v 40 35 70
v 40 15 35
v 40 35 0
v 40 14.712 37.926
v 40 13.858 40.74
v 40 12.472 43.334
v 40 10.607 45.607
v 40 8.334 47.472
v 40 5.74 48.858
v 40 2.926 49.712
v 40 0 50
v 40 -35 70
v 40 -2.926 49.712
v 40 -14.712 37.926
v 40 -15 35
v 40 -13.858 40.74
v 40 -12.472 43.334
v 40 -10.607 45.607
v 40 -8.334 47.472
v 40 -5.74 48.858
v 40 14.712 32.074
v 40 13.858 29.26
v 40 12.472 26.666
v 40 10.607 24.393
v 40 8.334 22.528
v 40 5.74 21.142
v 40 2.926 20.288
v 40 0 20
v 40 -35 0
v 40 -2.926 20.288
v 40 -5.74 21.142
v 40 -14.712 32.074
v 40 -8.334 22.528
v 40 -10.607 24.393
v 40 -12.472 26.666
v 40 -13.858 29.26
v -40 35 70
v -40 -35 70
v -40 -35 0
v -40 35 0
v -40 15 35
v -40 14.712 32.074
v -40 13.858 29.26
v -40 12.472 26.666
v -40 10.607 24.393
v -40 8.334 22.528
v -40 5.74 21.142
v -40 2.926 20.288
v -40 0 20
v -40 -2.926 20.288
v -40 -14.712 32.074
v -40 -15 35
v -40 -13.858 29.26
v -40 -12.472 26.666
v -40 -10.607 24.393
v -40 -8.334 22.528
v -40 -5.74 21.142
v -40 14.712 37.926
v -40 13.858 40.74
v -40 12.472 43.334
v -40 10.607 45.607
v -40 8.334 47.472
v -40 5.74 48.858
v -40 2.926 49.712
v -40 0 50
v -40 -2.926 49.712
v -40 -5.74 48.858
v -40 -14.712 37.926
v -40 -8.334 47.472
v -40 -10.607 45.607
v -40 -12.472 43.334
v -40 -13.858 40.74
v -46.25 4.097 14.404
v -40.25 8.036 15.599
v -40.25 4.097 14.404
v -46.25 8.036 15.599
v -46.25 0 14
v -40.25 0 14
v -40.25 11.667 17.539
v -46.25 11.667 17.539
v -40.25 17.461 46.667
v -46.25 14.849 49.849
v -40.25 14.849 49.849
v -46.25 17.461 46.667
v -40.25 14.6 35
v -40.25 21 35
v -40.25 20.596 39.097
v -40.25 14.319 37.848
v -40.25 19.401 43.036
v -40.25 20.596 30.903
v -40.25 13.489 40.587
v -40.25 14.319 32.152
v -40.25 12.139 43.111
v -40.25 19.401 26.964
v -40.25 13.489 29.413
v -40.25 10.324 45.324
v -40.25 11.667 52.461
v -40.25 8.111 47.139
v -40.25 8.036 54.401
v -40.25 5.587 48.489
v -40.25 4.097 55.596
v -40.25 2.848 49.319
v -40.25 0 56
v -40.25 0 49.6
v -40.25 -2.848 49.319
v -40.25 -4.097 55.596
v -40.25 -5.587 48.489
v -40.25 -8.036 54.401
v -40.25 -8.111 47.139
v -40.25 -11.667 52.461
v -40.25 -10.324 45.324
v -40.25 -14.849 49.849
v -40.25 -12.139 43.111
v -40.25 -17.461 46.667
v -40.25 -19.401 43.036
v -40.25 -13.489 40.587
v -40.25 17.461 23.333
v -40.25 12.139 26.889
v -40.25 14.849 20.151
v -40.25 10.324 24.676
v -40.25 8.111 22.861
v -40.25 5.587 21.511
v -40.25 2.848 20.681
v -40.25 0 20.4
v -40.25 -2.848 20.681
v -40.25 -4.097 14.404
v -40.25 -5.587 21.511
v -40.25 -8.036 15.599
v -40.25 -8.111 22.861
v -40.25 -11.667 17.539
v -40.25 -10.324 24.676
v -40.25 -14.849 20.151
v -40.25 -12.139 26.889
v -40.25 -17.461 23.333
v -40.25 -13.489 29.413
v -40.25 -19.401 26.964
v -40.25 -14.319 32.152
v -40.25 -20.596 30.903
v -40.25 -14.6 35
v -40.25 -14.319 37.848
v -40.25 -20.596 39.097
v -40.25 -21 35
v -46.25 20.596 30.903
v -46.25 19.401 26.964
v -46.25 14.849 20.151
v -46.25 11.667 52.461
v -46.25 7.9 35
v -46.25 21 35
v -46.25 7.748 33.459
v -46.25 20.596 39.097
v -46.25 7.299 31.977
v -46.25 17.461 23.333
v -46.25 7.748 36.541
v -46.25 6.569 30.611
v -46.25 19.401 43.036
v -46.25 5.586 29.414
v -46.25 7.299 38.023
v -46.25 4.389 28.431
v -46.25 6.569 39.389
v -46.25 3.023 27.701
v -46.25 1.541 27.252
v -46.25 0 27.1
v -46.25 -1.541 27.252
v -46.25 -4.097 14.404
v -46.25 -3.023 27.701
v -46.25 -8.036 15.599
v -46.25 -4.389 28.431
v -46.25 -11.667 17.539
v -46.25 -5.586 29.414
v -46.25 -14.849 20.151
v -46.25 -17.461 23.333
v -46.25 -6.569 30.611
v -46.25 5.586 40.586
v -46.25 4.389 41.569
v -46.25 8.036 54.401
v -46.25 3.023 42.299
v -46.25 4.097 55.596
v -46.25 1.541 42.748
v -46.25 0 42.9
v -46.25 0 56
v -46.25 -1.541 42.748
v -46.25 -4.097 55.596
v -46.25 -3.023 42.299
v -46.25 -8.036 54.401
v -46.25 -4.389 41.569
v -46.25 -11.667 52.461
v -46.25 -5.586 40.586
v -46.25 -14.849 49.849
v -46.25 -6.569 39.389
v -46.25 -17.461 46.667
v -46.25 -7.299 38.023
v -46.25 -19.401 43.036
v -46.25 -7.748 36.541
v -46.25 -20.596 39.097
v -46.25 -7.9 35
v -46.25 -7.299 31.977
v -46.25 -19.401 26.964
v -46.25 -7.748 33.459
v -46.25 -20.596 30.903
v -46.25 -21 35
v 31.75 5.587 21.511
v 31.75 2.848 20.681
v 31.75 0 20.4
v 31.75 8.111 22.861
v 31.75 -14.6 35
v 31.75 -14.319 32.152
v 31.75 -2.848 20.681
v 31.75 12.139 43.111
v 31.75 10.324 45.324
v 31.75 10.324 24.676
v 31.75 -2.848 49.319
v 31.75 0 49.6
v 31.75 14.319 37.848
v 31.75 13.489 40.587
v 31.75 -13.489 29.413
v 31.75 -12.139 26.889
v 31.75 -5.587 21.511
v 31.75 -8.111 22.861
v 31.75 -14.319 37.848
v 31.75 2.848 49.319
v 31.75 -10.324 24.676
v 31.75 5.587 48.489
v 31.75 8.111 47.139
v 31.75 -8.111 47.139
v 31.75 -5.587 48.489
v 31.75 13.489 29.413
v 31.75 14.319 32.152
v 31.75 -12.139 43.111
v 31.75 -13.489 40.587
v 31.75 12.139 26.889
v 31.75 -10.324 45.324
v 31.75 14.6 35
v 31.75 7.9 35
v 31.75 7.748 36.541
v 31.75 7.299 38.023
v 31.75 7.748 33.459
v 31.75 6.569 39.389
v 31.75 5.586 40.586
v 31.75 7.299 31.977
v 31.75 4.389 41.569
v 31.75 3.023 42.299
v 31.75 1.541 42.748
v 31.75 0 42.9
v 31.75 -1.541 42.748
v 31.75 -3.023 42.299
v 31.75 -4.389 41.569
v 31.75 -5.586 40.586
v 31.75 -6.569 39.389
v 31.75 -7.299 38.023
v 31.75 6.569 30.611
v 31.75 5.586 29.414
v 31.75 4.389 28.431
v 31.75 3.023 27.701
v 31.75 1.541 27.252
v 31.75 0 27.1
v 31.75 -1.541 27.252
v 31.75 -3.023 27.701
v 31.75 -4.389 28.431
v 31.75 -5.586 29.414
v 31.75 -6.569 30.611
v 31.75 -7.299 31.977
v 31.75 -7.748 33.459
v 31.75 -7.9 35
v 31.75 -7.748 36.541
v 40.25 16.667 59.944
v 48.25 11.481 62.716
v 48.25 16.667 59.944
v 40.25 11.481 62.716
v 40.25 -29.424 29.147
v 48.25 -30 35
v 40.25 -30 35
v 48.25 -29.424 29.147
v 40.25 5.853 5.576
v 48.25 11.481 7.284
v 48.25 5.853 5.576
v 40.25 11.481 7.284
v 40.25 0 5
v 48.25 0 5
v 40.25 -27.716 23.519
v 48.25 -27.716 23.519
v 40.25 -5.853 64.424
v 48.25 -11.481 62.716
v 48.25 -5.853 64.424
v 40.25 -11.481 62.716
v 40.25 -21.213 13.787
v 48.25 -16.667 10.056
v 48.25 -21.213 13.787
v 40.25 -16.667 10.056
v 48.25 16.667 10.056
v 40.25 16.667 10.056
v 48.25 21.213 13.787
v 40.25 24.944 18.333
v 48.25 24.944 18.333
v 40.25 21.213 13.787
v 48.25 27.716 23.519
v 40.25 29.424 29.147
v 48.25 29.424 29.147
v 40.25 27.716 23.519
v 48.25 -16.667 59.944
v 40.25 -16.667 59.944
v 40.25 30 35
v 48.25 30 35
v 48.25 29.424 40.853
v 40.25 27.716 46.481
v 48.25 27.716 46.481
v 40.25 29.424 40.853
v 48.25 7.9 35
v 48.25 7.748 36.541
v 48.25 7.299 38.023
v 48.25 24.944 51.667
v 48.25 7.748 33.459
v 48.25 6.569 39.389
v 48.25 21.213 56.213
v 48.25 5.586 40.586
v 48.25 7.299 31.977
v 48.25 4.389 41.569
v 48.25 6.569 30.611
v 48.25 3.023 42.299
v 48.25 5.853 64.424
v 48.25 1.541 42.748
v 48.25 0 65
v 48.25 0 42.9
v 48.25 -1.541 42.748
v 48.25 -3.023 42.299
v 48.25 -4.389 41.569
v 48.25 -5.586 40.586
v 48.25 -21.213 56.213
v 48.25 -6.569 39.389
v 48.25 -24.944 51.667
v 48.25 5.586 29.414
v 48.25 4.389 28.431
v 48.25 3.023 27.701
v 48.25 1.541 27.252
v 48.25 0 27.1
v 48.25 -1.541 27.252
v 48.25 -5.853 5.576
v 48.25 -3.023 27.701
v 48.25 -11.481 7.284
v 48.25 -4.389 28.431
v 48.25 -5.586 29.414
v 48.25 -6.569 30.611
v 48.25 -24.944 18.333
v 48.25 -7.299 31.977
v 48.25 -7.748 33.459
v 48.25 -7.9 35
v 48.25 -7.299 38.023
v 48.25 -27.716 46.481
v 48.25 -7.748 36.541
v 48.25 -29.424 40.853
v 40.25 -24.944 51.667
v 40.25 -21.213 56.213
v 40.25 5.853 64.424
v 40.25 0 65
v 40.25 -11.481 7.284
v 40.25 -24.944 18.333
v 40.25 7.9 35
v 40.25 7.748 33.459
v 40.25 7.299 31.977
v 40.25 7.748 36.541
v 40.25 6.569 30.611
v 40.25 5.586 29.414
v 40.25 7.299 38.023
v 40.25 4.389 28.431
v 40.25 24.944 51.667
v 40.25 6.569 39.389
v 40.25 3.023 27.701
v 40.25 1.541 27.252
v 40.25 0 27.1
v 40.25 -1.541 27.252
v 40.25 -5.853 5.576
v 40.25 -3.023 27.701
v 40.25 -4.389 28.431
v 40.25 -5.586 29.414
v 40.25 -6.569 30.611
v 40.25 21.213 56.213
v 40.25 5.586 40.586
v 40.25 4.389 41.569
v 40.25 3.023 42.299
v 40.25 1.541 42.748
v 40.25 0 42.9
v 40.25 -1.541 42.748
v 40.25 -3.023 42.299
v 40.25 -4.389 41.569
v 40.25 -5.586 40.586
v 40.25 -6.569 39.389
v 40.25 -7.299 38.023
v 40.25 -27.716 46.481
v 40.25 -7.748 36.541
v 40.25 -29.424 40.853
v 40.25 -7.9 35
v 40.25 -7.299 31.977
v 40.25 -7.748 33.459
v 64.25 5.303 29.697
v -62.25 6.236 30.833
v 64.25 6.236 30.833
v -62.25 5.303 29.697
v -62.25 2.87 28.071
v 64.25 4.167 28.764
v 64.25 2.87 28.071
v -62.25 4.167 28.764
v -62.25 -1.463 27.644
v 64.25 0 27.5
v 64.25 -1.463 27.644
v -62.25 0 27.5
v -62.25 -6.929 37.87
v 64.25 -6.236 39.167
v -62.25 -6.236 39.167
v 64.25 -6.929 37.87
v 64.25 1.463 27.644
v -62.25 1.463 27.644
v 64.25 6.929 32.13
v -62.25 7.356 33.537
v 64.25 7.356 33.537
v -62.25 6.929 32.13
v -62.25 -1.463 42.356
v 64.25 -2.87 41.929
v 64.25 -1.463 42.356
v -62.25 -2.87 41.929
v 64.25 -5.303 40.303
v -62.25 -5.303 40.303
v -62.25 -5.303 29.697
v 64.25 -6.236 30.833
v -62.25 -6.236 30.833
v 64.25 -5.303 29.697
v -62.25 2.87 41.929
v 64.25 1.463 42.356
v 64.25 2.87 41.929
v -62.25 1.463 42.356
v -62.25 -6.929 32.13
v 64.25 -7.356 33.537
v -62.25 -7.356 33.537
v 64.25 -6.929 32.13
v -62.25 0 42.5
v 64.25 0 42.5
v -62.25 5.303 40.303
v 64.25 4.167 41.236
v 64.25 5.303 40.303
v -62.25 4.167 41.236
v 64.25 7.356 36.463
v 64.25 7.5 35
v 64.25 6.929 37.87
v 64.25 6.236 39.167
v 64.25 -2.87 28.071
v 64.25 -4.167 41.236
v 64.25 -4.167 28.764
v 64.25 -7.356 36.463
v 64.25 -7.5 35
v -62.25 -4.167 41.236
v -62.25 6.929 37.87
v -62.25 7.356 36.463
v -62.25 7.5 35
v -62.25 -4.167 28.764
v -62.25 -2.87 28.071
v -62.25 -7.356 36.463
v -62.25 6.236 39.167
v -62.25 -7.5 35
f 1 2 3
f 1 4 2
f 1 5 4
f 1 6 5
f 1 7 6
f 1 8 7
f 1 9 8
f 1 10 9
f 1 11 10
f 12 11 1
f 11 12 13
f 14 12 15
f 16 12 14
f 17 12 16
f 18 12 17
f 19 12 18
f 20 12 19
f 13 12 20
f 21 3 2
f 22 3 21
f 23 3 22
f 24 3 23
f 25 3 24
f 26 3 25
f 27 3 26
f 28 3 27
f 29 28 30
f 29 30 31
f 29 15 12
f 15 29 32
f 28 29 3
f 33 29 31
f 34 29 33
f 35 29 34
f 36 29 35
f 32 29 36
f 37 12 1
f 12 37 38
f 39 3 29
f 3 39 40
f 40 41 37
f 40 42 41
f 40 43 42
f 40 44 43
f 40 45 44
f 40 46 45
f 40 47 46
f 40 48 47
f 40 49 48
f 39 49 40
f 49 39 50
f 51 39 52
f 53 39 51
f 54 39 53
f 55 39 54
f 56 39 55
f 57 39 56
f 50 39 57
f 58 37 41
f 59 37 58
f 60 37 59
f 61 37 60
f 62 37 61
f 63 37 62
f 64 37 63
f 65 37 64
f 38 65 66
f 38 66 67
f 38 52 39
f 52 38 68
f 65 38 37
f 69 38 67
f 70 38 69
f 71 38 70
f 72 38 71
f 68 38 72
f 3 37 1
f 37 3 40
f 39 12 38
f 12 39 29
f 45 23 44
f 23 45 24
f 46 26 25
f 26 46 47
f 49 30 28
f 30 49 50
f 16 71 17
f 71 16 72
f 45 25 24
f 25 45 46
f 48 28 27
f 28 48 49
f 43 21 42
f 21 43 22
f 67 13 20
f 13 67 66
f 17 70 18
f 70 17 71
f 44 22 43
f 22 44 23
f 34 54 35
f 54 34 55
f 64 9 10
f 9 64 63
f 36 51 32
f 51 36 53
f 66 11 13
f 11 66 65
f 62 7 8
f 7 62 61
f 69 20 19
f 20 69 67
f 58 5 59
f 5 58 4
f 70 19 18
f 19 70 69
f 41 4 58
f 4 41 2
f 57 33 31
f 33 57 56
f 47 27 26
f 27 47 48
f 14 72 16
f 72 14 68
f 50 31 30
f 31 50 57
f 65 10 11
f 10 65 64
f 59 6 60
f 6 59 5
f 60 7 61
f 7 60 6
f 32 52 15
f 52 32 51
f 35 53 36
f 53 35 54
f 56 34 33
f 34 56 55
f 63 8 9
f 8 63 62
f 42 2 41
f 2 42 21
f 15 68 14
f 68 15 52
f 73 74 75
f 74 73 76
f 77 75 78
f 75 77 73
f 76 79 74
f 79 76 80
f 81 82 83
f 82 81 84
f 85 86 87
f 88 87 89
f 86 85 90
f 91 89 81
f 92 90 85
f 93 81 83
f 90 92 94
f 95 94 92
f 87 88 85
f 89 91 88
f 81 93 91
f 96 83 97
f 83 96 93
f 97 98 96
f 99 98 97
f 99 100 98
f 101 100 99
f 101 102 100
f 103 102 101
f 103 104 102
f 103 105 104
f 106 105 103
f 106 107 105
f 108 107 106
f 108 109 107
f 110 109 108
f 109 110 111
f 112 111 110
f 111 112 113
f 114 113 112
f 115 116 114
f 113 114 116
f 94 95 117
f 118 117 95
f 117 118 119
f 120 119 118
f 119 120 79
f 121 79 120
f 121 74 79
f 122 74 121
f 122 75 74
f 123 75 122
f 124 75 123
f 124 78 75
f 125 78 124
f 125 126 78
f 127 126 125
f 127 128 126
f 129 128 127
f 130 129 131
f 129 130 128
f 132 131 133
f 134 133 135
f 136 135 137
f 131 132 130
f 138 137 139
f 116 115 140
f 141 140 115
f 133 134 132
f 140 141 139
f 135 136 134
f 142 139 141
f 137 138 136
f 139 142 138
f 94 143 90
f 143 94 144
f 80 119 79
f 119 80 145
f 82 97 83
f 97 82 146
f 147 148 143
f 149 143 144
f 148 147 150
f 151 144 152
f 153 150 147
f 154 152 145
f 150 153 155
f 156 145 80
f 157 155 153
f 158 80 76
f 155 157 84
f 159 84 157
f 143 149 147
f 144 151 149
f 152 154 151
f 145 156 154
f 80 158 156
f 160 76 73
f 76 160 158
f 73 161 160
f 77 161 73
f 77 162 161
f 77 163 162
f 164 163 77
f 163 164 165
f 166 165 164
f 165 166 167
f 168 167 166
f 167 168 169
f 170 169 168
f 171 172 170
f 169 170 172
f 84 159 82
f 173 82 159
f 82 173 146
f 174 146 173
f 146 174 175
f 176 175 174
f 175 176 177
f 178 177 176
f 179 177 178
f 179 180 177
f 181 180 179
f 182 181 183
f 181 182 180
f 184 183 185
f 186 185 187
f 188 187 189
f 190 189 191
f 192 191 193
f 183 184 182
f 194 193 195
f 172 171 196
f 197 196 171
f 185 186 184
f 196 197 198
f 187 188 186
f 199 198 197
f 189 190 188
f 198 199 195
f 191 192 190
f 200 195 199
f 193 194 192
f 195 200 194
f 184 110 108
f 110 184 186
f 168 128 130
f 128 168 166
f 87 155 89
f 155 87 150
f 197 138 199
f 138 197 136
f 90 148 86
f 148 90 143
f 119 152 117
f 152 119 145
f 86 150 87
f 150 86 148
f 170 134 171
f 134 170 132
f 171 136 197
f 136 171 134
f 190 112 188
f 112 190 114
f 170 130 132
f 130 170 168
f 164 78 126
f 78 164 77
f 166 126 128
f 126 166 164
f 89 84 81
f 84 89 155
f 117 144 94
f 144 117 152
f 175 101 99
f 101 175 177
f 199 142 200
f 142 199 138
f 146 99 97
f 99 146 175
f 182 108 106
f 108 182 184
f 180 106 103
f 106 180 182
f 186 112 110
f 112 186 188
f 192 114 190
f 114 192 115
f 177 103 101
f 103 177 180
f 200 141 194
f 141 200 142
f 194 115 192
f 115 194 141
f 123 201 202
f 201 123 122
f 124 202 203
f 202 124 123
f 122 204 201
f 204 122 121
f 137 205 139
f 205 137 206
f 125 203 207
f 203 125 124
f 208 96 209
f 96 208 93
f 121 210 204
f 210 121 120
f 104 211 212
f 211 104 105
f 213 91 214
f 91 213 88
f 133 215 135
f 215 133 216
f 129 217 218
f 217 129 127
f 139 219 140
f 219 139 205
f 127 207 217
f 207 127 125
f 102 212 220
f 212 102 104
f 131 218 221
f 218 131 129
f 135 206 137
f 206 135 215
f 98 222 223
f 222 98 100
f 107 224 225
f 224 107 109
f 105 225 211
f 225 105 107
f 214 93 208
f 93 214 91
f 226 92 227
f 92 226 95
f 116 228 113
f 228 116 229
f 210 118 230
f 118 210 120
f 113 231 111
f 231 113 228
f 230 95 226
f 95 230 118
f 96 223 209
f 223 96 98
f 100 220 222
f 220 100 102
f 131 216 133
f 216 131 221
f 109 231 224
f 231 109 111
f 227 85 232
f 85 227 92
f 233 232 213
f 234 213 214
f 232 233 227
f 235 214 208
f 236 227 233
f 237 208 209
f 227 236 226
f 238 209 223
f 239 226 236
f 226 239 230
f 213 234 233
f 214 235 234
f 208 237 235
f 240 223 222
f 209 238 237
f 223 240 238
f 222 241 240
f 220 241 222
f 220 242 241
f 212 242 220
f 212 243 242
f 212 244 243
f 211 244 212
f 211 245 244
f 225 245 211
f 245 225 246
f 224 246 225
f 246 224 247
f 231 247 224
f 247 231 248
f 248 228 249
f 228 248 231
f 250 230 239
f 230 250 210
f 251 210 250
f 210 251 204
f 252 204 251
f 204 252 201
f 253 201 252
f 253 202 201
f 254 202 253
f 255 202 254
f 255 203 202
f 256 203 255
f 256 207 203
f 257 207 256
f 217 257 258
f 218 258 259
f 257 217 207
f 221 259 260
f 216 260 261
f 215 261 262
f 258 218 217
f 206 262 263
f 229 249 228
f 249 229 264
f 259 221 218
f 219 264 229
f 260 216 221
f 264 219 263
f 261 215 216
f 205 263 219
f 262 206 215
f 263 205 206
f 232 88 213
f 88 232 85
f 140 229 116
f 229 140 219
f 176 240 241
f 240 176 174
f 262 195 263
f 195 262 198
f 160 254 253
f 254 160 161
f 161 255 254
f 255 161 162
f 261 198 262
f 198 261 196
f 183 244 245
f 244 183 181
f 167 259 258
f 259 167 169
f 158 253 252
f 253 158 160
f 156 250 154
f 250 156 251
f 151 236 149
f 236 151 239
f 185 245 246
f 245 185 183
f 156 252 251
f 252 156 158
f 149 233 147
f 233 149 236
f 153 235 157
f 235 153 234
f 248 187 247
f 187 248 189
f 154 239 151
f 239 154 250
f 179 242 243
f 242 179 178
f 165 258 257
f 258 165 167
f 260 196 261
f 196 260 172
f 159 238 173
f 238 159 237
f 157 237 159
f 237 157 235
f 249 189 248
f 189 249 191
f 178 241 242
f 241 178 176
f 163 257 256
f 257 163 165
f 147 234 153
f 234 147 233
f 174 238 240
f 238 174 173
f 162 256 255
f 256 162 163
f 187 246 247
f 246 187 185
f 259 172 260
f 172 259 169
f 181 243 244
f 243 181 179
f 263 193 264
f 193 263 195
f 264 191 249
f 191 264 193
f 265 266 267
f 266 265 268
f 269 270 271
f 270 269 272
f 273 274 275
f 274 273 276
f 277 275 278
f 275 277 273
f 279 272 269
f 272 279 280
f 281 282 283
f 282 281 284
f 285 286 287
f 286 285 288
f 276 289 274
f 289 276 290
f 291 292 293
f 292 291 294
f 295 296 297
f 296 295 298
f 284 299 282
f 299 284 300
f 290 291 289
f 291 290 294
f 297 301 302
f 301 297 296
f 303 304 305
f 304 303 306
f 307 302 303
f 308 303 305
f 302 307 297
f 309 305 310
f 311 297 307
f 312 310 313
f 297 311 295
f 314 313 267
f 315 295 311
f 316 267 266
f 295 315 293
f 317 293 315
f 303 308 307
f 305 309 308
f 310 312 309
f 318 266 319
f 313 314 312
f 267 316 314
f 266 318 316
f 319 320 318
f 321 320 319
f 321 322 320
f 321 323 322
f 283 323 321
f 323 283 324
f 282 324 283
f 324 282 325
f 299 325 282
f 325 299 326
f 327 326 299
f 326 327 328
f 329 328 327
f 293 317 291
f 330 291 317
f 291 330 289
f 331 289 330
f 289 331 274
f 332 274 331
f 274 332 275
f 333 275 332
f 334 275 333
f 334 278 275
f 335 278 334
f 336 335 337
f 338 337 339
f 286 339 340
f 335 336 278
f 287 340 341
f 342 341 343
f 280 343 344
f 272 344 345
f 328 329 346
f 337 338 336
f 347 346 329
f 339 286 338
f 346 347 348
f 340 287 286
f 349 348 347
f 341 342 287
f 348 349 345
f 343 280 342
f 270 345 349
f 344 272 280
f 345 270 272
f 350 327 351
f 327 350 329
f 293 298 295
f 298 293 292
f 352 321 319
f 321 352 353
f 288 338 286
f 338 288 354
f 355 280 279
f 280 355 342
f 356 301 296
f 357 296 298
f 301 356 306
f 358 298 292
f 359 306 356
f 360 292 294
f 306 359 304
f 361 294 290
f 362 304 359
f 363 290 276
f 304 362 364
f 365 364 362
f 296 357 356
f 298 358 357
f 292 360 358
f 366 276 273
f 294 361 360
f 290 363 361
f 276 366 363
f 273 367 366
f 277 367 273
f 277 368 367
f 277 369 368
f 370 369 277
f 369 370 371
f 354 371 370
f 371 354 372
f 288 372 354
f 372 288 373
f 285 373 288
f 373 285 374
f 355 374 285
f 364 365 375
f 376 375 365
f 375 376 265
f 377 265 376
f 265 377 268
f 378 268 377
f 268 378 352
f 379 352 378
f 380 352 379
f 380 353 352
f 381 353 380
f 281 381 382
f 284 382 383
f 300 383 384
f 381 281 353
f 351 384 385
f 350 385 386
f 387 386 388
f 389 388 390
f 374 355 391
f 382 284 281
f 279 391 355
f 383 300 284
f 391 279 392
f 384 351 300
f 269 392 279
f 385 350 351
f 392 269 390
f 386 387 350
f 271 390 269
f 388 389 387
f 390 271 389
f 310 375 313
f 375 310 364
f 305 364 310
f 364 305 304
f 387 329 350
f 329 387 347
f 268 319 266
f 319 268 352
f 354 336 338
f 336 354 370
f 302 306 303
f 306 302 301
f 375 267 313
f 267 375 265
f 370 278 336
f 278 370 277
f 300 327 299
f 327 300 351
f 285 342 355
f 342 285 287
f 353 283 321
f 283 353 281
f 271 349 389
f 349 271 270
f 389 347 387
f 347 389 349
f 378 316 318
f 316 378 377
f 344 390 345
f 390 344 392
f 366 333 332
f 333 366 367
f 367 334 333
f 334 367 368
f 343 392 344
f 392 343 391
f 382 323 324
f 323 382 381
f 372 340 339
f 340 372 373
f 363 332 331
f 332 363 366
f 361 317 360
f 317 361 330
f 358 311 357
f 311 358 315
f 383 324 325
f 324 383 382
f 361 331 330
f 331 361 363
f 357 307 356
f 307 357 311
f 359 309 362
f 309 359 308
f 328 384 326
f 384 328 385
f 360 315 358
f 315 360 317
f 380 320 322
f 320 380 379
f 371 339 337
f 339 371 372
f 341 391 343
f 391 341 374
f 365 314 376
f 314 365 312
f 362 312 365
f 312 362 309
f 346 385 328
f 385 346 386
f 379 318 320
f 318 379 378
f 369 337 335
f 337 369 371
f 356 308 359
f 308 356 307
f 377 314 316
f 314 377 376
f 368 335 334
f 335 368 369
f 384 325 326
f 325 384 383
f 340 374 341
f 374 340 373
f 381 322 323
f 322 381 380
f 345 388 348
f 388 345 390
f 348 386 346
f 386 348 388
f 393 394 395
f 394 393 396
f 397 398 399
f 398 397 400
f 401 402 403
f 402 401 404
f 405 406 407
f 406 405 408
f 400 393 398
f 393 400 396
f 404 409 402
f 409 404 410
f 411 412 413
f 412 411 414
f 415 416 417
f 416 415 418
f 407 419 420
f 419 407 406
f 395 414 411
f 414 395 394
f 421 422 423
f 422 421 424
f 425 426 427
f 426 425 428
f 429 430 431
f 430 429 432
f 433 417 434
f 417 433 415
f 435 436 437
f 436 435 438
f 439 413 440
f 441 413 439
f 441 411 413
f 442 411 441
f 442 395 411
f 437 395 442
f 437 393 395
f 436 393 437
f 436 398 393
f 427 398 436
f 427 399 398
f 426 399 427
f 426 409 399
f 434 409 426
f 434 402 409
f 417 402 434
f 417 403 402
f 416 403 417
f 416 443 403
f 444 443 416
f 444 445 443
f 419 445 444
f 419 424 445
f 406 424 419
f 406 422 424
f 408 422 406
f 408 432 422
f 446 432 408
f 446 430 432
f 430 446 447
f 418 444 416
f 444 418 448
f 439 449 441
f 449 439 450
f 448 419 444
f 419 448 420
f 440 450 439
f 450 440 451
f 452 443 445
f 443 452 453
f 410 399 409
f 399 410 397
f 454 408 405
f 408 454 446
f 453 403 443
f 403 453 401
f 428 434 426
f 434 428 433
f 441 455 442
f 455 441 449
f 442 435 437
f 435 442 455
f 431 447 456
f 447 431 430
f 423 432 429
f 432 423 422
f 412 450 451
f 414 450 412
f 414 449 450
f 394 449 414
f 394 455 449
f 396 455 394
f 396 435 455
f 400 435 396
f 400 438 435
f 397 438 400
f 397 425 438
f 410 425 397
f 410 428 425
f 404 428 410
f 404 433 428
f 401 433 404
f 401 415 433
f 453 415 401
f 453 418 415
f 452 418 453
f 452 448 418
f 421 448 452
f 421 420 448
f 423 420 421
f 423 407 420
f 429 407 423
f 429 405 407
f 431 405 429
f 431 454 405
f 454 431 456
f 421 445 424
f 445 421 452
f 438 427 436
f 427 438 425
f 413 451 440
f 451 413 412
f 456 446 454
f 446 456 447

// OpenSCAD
$fn = 32;

// ------------------------------------------------------------------------
// Bushed housing: 80 x 70 x 70 mm housing, bushing d29.2
// Every part is its own module, assembly() places them once.
// ------------------------------------------------------------------------

// --- part 1 ---
module housing() {
  difference() {
    translate([-40, -35, 0]) cube([80, 70, 70]);
    translate([0, 0, 35]) rotate([0, 90, 0]) cylinder(h = 82, d = 30, center = true);
  }
}

// --- part 2 ---
module bushing() {
  difference() {
    union() {
      cylinder(h = 6, d = 42);
      translate([0, 0, 6]) cylinder(h = 72, d = 29.2);
    }
    translate([0, 0, -1]) cylinder(h = 80, d = 15.8);
  }
}

// --- part 3 ---
module shaft() {
  translate([0, 0, -63.25]) cylinder(h = 126.5, d = 15);
}

// --- part 4 ---
module cover() {
  difference() {
    cylinder(h = 8, d = 60);
    translate([0, 0, -1]) cylinder(h = 10, d = 15.8);
  }
}

// --- assembly ---
module assembly() {
  translate([0, 0, 0]) rotate([0, 0, 0]) housing();
  translate([-46.25, 0, 35]) rotate([0, 90, 0]) bushing();
  translate([1, 0, 35]) rotate([0, 90, 0]) shaft();
  translate([40.25, 0, 35]) rotate([0, 90, 0]) cover();
}

assembly();
